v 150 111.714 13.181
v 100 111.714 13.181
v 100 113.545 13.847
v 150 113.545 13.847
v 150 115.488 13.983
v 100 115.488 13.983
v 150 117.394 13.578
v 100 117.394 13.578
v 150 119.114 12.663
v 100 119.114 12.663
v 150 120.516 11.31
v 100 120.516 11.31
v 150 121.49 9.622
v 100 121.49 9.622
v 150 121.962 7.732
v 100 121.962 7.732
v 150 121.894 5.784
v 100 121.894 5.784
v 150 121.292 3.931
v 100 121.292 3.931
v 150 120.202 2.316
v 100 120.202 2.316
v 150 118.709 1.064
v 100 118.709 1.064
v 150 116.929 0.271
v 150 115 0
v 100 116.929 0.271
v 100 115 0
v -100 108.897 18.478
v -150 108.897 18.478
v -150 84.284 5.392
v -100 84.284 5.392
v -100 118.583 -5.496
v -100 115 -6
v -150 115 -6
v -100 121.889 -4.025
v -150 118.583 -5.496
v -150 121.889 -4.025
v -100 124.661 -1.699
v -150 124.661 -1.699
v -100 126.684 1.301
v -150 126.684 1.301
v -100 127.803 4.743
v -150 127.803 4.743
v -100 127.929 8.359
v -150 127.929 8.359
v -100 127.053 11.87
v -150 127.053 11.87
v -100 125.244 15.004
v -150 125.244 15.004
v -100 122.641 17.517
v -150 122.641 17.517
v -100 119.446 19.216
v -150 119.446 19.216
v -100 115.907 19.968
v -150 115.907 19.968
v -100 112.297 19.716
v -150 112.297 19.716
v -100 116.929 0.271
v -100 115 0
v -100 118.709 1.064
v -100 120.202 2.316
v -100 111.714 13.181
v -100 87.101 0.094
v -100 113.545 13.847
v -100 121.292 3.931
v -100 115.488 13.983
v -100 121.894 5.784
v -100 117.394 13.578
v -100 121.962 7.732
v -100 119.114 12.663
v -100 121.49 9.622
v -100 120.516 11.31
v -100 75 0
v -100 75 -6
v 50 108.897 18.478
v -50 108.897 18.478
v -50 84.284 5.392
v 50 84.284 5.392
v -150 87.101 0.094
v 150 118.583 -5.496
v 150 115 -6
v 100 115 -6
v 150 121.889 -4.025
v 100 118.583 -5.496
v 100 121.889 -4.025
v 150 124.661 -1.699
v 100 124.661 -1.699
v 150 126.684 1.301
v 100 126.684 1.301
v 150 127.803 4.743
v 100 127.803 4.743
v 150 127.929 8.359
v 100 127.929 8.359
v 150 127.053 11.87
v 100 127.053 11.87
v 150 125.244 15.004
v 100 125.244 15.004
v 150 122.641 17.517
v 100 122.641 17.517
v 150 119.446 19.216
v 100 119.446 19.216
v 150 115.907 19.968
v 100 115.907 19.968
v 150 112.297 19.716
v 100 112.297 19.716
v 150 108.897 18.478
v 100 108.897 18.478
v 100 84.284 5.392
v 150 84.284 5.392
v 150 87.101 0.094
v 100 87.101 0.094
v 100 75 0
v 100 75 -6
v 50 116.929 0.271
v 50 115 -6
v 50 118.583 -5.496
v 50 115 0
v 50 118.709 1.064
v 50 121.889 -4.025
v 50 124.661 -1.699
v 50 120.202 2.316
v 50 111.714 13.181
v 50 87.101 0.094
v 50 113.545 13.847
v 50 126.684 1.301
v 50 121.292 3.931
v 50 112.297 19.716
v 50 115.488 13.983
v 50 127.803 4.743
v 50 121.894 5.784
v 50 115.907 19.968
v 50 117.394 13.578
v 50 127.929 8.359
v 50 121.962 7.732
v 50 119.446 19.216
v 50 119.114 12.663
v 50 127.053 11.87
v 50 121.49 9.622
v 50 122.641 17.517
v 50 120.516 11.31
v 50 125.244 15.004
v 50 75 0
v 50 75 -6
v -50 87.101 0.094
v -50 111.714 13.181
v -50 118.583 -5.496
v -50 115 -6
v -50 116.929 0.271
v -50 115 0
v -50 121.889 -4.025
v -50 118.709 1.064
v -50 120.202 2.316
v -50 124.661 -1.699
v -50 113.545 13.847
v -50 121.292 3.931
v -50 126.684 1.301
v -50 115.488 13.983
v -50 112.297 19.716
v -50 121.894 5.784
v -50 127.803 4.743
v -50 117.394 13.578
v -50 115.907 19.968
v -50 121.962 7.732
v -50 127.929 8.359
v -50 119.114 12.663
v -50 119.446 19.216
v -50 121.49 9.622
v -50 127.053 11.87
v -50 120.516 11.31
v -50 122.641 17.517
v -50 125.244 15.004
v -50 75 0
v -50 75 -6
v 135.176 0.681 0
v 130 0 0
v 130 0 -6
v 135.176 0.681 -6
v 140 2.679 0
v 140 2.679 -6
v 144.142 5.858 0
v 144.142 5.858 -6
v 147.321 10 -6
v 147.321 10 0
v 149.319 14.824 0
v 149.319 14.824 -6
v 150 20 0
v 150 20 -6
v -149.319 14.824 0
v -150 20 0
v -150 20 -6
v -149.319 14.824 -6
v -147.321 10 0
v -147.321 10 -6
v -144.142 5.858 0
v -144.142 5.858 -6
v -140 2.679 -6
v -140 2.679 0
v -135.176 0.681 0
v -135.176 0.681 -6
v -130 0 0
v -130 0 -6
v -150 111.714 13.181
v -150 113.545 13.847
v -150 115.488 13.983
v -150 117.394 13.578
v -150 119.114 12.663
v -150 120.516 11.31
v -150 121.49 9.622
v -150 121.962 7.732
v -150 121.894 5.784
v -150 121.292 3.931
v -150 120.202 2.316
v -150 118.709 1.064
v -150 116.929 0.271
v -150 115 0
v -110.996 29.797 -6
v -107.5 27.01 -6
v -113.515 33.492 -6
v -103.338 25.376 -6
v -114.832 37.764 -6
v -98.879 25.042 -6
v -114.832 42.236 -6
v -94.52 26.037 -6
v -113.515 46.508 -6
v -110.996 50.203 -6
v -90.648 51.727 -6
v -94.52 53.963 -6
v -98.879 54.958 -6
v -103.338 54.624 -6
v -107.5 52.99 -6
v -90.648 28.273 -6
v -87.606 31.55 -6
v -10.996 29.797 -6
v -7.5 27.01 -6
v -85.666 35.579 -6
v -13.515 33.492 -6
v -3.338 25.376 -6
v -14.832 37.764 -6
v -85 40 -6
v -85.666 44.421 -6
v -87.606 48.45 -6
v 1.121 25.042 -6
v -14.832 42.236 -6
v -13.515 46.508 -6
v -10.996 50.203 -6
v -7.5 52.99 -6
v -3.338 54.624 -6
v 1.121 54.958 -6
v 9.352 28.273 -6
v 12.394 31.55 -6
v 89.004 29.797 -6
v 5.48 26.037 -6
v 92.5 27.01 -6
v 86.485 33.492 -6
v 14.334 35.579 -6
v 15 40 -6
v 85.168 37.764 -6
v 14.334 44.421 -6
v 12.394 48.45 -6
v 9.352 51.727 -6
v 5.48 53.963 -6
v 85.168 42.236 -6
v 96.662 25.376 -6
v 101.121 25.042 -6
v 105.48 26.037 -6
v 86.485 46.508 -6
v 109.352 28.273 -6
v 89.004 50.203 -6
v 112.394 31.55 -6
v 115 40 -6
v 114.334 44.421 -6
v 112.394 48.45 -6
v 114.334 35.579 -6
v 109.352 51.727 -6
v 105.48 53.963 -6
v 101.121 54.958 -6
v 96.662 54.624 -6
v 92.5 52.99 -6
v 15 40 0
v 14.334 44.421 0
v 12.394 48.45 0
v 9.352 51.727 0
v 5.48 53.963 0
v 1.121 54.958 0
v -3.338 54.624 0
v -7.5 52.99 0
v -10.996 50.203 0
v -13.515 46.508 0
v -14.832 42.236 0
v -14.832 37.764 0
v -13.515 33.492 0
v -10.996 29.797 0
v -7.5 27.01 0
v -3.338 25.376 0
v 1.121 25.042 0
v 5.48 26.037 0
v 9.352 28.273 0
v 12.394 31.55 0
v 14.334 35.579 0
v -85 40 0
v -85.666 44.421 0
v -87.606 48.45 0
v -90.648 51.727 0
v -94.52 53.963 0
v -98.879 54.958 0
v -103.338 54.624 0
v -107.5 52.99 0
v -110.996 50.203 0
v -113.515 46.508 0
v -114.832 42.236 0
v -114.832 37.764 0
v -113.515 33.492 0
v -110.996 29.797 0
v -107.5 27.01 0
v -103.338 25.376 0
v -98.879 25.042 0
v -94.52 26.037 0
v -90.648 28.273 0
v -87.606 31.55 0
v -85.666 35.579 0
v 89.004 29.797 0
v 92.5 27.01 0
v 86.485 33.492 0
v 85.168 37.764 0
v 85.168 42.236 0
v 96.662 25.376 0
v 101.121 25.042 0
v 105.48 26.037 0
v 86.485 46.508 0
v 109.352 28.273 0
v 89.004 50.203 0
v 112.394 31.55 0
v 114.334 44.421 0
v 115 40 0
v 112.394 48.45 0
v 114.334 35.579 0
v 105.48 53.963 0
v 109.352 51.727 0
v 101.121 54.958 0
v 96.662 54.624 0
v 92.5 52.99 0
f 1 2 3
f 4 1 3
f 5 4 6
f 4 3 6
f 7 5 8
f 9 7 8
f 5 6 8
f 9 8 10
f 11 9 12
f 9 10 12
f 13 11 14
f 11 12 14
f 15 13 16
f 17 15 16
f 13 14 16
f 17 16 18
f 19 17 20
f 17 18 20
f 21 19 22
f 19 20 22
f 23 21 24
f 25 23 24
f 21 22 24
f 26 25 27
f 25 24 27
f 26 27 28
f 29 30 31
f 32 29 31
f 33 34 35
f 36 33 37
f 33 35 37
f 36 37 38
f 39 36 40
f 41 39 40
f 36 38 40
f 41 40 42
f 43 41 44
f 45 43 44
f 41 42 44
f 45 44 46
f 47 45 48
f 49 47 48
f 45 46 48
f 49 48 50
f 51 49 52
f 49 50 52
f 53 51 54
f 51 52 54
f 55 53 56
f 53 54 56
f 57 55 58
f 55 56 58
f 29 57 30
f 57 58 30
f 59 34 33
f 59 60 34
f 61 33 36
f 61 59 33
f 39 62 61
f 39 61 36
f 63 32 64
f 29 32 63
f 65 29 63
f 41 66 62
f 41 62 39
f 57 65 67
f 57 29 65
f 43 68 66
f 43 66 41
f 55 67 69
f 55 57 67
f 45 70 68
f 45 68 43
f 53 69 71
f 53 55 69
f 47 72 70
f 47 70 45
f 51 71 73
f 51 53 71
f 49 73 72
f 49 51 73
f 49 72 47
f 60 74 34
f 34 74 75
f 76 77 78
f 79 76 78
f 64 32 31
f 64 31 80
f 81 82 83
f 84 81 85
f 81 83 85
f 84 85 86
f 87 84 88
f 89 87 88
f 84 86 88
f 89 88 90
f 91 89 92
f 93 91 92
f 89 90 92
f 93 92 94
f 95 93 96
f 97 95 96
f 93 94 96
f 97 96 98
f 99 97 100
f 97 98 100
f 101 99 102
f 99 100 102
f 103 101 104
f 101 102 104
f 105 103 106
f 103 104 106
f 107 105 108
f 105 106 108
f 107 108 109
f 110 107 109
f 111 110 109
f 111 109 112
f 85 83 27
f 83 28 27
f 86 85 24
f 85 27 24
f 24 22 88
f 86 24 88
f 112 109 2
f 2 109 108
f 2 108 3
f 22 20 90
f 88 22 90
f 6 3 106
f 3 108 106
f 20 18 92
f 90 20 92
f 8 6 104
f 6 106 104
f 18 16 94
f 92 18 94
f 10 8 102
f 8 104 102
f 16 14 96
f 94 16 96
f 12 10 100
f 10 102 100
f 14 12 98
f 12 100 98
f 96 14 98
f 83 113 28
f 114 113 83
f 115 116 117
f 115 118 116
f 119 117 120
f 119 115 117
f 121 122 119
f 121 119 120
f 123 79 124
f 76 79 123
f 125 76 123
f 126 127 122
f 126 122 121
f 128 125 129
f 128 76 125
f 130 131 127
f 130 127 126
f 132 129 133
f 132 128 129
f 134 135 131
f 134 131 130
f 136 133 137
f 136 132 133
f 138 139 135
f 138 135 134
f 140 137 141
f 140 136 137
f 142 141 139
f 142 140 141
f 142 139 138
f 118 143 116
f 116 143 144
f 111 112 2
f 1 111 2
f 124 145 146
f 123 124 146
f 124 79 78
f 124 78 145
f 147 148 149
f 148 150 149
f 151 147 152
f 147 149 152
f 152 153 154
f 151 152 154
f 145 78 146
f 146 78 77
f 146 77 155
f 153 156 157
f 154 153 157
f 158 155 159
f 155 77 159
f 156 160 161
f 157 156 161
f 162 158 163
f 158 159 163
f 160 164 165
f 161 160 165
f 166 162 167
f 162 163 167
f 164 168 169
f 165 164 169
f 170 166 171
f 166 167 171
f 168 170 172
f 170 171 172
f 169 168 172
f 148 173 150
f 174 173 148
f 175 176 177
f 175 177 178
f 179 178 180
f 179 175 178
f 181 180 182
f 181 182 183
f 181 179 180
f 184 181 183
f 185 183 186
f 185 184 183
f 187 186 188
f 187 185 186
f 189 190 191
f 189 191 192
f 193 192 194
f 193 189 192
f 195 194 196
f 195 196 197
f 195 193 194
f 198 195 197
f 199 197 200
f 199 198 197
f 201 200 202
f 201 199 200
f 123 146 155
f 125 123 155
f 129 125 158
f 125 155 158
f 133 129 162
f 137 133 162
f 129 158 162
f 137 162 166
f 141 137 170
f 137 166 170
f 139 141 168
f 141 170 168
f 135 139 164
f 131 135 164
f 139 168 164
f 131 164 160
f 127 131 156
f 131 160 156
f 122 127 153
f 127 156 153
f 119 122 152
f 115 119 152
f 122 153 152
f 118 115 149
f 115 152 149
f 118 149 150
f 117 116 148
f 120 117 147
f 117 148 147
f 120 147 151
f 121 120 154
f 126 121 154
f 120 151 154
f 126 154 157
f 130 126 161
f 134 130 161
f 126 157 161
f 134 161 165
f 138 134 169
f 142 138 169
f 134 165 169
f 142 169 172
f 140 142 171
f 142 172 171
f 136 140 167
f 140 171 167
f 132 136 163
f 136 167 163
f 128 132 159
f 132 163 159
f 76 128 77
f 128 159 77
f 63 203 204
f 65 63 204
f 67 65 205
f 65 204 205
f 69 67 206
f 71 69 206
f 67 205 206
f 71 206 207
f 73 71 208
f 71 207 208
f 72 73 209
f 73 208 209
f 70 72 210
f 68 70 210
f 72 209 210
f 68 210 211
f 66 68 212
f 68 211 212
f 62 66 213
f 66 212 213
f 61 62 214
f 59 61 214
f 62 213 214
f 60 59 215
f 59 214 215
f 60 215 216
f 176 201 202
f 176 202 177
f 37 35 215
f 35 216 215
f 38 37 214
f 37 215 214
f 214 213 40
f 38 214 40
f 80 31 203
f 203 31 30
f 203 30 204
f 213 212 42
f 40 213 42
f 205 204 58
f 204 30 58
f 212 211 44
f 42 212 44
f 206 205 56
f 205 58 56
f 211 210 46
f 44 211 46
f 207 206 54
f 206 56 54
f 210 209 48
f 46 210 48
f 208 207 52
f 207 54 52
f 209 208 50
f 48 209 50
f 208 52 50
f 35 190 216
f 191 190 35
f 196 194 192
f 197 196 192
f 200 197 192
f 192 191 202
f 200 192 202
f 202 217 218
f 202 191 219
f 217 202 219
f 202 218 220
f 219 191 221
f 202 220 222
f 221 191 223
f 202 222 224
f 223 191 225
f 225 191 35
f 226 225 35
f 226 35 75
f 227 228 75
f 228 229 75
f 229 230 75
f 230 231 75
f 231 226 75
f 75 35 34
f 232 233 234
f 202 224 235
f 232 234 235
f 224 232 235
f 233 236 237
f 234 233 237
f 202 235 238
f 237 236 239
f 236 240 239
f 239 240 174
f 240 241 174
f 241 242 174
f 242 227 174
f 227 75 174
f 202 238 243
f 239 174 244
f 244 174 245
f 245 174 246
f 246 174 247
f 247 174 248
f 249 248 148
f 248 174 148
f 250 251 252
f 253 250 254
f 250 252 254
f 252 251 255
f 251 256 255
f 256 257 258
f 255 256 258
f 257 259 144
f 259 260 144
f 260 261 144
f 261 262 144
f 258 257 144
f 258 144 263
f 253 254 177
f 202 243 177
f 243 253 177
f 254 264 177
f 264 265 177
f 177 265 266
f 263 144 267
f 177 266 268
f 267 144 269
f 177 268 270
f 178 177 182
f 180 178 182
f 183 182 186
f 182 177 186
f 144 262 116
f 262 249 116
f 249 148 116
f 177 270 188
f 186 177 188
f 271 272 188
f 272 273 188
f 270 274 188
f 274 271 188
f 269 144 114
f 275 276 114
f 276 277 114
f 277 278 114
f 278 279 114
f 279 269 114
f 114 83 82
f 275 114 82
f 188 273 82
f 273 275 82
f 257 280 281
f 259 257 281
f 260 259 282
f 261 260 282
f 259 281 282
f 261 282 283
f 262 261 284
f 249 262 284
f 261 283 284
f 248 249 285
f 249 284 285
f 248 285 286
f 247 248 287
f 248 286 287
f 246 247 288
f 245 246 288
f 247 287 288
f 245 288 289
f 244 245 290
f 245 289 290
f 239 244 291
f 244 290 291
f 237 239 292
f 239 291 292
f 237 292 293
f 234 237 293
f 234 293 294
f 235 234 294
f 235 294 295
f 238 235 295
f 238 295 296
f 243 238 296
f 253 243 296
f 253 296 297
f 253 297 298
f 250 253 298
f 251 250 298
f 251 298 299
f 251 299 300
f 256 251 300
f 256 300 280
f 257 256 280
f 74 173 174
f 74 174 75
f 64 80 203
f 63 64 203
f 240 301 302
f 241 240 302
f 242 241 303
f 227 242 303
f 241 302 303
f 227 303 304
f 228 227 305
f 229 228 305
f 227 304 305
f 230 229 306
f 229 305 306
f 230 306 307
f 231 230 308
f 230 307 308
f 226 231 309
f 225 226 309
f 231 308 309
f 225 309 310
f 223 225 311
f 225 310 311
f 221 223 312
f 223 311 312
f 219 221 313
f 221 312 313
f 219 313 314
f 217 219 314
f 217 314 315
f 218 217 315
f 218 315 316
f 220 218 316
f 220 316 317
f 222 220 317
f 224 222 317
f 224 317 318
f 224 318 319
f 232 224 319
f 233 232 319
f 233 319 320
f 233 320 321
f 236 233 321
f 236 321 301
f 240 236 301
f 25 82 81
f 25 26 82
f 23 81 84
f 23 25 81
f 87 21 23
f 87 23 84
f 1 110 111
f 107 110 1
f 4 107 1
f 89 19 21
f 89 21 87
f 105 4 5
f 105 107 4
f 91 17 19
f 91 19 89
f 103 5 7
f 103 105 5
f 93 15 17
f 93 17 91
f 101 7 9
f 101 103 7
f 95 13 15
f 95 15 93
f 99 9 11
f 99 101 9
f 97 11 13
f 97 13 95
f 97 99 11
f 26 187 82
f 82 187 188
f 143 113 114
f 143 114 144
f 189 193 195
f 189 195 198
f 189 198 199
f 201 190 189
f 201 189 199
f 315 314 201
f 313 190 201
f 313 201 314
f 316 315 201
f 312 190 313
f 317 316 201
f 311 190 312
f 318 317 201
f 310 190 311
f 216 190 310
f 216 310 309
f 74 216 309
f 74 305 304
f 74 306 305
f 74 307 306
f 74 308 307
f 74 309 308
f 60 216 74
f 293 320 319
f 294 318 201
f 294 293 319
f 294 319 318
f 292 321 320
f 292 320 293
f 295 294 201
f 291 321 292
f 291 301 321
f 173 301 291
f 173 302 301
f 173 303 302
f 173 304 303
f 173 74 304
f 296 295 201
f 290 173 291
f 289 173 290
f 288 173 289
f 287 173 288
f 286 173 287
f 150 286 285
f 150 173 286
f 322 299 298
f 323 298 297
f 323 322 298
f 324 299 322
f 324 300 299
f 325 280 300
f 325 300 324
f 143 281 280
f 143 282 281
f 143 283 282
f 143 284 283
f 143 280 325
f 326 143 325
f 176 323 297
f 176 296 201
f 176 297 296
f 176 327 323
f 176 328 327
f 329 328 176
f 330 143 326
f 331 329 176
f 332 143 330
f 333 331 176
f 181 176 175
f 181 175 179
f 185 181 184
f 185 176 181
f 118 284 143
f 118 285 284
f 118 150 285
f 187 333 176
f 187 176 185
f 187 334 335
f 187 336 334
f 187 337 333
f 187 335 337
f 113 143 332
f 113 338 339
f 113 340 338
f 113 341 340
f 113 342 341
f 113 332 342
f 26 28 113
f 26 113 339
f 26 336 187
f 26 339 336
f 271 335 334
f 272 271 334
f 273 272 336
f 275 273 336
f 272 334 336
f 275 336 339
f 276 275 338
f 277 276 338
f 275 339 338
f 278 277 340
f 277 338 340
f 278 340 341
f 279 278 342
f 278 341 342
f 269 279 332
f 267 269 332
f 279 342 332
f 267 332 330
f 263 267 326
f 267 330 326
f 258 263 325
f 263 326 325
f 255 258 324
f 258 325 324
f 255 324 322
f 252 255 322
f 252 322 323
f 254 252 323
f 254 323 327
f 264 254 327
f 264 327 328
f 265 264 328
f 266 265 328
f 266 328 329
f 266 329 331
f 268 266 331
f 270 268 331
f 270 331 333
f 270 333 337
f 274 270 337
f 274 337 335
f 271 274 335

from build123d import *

# Parameters (mm, degrees)
BASE_FLANGE1_DEPTH = 6
HEM1_START         = -50
HEM1_DEPTH         = 100
HEM1_START_2       = -150
HEM1_2_DEPTH       = 50
HEM1_START_3       = 100
HEM1_3_DEPTH       = 50
SKETCH14_R         = 15
CUT_EXTRUDE1_DEPTH = 10


# Read off the part's stored shape, not the designer's step: Hem1
# Sheet-metal steps are written as plain solids
with BuildPart() as part:
    # Sketch1 → Base-Flange1 (new body)
    with BuildSketch(Plane.XY):
        with BuildLine():
            Line((100, 75), (50, 75))
            Line((50, 75), (50, 115))
            Line((50, 115), (-50, 115))
            Line((-50, 115), (-50, 75))
            Line((-50, 75), (-100, 75))
            Line((-100, 75), (-100, 115))
            Line((-100, 115), (-150, 115))
            Line((-150, 115), (-150, 20))
            ThreePointArc((-150, 20), (-144.142135624, 5.857864376), (-130, 0))
            Line((-130, 0), (130, 0))
            ThreePointArc((130, 0), (144.142135624, 5.857864376), (150, 20))
            Line((150, 20), (150, 115))
            Line((150, 115), (100, 115))
            Line((100, 115), (100, 75))
        make_face()
    extrude(amount=-BASE_FLANGE1_DEPTH)

    # Hem1 outline → Hem1 (add)
    with BuildSketch(Plane.YZ.offset(HEM1_START)):
        with BuildLine():
            Line((84.284293607, 5.39157987), (87.101122984, 0.093894313))
            Line((87.101122984, 0.093894313), (111.71369906, 13.18063315))
            ThreePointArc((111.71369906, 13.18063315), (121.792070084, 8.69345327), (115, 0))
            Line((115, 0), (115, -6))
            ThreePointArc((115, -6), (127.613844442, 10.144984643), (108.896869684, 18.478318707))
            Line((108.896869684, 18.478318707), (84.284293607, 5.39157987))
        make_face()
    extrude(amount=HEM1_DEPTH)

    # Hem1 2 outline → Hem1 2 (add)
    with BuildSketch(Plane.YZ.offset(HEM1_START_2)):
        with BuildLine():
            Line((84.284293607, 5.39157987), (87.101122984, 0.093894313))
            Line((87.101122984, 0.093894313), (111.71369906, 13.18063315))
            ThreePointArc((111.71369906, 13.18063315), (121.792070084, 8.69345327), (115, 0))
            Line((115, 0), (115, -6))
            ThreePointArc((115, -6), (127.613844442, 10.144984643), (108.896869684, 18.478318707))
            Line((108.896869684, 18.478318707), (84.284293607, 5.39157987))
        make_face()
    extrude(amount=HEM1_2_DEPTH)

    # Hem1 3 outline → Hem1 3 (add)
    with BuildSketch(Plane.YZ.offset(HEM1_START_3)):
        with BuildLine():
            Line((84.284293607, 5.39157987), (87.101122984, 0.093894313))
            Line((87.101122984, 0.093894313), (111.71369906, 13.18063315))
            ThreePointArc((111.71369906, 13.18063315), (121.792070084, 8.69345327), (115, 0))
            Line((115, 0), (115, -6))
            ThreePointArc((115, -6), (127.613844442, 10.144984643), (108.896869684, 18.478318707))
            Line((108.896869684, 18.478318707), (84.284293607, 5.39157987))
        make_face()
    extrude(amount=HEM1_3_DEPTH)

    # Sketch14 → Cut-Extrude1 (cut)
    with BuildSketch(Plane.XY):
        with Locations((100, 40)):
            Circle(SKETCH14_R)
        with Locations((0, 40)):
            Circle(SKETCH14_R)
        with Locations((-100, 40)):
            Circle(SKETCH14_R)
    extrude(amount=-CUT_EXTRUDE1_DEPTH, mode=Mode.SUBTRACT)


solid = part.part
